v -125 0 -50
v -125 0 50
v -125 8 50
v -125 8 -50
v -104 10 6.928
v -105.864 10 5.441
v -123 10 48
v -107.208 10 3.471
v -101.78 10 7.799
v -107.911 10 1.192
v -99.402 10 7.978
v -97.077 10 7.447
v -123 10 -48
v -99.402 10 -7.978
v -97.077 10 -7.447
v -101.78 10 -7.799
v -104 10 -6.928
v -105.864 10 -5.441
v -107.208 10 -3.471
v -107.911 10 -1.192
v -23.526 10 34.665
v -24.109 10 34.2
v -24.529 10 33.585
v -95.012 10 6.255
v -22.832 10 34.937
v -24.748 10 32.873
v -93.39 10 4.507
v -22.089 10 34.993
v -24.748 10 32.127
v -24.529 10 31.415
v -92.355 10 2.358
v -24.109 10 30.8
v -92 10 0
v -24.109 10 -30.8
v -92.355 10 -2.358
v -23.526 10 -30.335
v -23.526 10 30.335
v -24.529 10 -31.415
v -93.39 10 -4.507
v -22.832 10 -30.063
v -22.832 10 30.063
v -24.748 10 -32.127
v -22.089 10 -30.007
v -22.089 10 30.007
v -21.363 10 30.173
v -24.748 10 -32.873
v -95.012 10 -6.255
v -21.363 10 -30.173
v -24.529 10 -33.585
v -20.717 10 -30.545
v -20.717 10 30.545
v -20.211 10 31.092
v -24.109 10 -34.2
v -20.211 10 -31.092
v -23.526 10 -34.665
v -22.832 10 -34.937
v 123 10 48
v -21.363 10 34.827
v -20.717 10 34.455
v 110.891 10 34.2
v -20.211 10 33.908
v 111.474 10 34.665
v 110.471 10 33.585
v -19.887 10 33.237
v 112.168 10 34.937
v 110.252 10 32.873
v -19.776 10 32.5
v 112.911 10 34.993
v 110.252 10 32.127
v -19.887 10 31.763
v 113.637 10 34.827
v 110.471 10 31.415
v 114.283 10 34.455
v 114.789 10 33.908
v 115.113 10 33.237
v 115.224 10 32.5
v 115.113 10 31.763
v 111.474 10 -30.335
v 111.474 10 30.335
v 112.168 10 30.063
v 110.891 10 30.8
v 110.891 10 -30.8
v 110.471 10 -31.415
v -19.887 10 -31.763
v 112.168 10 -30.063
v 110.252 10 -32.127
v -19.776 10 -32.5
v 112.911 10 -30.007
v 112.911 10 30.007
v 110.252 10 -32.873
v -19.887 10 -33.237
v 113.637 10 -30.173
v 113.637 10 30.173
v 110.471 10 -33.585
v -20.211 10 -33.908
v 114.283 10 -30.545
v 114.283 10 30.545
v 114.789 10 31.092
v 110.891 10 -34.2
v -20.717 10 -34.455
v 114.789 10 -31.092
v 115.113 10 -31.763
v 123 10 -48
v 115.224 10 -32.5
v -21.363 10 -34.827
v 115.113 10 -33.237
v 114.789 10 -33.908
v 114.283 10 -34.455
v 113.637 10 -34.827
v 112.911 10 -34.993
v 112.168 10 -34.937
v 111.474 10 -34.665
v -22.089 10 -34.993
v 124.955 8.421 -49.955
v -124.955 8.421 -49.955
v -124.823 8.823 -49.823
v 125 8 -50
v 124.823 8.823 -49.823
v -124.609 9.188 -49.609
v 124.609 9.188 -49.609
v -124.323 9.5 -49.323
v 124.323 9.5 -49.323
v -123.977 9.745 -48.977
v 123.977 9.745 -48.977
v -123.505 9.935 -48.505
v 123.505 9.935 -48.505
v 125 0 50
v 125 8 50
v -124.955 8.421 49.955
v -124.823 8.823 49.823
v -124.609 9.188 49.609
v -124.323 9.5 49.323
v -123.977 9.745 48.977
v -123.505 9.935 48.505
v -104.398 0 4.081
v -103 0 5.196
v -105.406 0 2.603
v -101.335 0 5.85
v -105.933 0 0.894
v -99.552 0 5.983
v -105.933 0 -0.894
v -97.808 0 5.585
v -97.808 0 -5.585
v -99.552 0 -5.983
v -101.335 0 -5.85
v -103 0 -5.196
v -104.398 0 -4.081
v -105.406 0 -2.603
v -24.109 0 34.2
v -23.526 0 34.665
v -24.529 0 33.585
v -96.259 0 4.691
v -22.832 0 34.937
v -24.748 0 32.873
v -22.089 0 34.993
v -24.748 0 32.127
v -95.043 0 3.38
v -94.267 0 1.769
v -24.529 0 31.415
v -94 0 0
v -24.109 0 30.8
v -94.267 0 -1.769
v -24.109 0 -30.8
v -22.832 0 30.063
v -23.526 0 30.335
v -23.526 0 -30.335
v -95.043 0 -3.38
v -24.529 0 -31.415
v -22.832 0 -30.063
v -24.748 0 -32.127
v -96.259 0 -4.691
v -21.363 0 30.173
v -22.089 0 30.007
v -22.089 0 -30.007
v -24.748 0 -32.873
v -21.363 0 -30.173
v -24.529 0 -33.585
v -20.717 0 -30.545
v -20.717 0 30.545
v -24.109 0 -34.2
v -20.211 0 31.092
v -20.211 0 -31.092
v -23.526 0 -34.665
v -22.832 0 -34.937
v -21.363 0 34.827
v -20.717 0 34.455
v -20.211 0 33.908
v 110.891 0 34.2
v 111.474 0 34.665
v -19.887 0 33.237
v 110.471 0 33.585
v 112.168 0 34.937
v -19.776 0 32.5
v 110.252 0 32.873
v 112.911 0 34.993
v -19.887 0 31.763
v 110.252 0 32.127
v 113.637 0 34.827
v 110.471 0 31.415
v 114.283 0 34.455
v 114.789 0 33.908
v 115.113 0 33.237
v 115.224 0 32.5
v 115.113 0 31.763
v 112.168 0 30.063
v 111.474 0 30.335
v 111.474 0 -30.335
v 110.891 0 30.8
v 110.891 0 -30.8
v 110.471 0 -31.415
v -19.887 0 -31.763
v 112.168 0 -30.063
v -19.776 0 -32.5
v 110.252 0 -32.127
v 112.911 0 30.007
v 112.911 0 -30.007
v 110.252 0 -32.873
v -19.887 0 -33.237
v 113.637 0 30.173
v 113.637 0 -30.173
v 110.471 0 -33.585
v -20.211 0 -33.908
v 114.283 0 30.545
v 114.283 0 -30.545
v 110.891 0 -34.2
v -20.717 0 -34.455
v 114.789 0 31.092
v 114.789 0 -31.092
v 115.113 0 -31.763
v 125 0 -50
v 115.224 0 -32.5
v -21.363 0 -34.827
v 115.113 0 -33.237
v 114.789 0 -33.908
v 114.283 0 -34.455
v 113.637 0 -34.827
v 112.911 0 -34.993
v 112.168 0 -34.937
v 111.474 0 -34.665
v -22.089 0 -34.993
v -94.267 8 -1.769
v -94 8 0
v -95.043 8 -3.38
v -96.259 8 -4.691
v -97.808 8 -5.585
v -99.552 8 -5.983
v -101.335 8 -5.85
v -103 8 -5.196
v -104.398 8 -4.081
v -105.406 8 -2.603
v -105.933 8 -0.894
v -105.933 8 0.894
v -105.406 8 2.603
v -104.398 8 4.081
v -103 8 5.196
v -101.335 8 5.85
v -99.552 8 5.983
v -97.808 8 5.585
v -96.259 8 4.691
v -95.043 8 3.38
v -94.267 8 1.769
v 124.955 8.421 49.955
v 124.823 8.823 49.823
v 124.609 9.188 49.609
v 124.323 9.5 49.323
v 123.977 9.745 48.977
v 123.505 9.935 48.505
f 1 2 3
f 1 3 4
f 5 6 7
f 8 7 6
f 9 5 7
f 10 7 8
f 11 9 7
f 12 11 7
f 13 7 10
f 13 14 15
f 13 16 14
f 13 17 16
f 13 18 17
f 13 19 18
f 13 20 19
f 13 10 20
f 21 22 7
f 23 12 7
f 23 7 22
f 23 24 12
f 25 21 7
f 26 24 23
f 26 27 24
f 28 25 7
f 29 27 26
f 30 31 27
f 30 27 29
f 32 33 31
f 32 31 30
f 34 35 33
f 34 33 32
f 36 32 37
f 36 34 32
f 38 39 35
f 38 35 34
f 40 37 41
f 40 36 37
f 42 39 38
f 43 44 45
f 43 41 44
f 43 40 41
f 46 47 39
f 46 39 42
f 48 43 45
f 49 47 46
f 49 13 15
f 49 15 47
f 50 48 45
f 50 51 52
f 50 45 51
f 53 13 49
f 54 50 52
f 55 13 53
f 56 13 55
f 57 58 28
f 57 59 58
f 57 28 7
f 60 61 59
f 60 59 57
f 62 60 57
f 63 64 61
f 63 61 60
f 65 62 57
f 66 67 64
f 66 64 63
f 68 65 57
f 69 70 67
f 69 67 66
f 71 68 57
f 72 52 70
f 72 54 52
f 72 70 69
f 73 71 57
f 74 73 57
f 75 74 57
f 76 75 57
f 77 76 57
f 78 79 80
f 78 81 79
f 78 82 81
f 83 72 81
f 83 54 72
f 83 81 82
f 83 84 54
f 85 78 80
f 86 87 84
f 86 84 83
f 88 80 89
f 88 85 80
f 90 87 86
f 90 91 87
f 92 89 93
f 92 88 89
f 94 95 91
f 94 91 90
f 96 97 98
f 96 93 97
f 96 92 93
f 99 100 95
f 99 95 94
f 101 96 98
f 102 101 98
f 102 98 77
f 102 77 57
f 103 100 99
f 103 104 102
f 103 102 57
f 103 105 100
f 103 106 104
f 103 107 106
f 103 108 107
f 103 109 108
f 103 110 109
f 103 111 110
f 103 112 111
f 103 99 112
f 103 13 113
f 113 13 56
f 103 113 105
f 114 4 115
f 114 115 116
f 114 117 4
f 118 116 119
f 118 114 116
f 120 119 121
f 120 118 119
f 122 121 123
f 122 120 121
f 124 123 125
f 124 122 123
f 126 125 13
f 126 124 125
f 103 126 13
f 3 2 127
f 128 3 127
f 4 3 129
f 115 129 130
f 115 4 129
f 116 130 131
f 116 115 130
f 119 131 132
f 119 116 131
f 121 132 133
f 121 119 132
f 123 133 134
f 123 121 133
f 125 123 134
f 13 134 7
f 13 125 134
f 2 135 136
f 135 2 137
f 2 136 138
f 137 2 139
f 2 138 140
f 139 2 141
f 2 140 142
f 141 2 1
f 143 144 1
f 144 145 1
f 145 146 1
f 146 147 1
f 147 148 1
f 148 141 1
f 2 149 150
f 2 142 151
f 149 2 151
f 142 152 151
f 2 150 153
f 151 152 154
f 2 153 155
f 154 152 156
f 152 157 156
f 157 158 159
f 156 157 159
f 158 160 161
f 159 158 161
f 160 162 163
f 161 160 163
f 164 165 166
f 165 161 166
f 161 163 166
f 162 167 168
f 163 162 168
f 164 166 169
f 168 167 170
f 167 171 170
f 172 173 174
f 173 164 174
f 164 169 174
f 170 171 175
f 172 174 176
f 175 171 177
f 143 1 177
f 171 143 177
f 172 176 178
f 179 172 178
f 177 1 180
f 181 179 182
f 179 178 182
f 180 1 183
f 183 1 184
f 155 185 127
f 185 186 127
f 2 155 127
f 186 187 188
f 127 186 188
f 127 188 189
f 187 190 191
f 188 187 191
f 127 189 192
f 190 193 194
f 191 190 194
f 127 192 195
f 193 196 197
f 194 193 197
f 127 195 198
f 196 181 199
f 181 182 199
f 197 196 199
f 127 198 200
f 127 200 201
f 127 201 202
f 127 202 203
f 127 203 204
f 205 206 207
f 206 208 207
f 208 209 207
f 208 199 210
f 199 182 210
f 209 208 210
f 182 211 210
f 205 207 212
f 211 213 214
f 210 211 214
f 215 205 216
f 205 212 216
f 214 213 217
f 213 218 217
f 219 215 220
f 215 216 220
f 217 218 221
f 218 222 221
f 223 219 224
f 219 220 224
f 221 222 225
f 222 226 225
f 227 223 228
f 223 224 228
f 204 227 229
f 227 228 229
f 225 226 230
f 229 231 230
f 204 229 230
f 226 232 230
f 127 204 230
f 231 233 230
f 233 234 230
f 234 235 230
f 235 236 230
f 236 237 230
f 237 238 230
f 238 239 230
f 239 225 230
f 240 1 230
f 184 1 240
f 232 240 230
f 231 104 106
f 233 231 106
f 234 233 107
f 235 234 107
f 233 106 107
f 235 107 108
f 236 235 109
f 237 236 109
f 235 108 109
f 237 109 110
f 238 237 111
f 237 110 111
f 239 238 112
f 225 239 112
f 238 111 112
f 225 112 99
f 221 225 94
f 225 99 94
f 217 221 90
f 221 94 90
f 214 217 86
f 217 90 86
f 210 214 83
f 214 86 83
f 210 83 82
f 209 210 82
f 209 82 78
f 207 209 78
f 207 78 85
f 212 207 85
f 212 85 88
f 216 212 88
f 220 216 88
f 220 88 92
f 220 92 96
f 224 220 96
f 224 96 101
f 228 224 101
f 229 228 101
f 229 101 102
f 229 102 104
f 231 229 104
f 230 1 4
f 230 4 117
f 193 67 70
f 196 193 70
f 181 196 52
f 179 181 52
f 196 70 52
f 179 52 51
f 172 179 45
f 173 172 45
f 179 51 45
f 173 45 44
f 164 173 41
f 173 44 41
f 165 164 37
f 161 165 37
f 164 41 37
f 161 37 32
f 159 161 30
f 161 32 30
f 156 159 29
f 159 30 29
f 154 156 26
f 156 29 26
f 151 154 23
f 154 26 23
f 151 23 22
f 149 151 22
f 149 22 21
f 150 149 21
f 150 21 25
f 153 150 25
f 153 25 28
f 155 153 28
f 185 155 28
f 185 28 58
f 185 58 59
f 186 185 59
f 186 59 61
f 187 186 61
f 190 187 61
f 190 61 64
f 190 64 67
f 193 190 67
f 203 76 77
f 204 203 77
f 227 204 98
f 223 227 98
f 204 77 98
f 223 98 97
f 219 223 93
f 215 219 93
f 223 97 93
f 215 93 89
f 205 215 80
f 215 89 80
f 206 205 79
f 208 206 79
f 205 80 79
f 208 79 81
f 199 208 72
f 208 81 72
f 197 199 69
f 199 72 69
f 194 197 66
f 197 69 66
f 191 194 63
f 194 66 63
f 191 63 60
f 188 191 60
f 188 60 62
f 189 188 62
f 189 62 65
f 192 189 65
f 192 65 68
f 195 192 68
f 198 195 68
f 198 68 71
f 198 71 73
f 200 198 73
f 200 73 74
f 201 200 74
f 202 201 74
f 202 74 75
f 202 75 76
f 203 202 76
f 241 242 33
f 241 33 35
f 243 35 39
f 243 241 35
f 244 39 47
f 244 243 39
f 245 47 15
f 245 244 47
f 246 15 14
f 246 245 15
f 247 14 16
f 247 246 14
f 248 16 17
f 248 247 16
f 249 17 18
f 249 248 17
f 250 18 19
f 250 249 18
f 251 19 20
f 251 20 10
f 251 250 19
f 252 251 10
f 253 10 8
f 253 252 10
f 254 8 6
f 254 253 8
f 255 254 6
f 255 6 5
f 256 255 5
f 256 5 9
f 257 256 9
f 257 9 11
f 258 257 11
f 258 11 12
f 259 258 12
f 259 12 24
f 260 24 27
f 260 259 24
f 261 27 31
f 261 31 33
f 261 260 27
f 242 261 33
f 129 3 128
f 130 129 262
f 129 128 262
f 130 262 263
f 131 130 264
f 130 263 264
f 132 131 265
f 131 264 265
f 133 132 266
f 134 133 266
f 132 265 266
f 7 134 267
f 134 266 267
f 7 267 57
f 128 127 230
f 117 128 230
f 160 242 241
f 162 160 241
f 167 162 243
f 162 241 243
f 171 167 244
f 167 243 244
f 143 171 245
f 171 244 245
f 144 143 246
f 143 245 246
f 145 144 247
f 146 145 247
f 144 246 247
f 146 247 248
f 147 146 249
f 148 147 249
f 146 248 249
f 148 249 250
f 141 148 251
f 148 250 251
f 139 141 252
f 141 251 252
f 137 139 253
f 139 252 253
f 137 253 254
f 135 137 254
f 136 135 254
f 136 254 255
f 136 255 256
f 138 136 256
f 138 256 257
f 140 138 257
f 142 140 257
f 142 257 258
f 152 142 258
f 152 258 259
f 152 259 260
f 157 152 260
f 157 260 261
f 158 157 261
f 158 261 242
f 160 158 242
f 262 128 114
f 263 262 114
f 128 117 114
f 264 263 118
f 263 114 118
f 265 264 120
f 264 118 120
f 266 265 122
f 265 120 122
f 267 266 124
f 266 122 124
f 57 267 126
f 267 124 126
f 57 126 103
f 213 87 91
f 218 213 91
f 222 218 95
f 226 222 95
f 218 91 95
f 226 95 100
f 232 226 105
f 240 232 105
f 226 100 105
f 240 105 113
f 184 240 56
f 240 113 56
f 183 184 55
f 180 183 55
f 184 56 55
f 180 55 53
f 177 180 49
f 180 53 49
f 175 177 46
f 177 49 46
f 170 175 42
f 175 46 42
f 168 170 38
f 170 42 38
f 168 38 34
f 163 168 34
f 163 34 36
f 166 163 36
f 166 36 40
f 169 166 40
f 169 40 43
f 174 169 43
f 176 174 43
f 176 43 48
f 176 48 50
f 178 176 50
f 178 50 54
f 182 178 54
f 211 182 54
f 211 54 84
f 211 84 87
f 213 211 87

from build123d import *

# Parameters (mm, degrees)
SKETCH1_W           = 250
SKETCH1_H           = 100
BOSS_EXTRUDE1_DEPTH = 10
FILLET1_R           = 2
SKETCH2_R           = 6
CUT_EXTRUDE1_DEPTH  = 11
CHAMFER1_SIZE       = 2
SKETCH3_R           = 2.5
CUT_EXTRUDE2_DEPTH  = 11


with BuildPart() as part:
    # Sketch1 → Boss-Extrude1 (new body)
    with BuildSketch(Plane(origin=(0, 0, 0), x_dir=(1, 0, 0), z_dir=(0, 1, 0))):
        Rectangle(SKETCH1_W, SKETCH1_H)
    extrude(amount=BOSS_EXTRUDE1_DEPTH)

    # Fillet1
    fillet1_edges = [part.edges().sort_by_distance(p)[0] for p in [
        (125, 10, 0),
        (0, 10, -50),
        (-125, 10, 0),
        (0, 10, 50),
    ]]
    fillet(fillet1_edges, radius=FILLET1_R)

    # Sketch2 → Cut-Extrude1 (cut, through all)
    with BuildSketch(Plane(origin=(0, 10, 0), x_dir=(1, 0, 0), z_dir=(0, 1, 0))):
        with Locations((-100, 0)):
            Circle(SKETCH2_R)
    extrude(amount=-CUT_EXTRUDE1_DEPTH, mode=Mode.SUBTRACT)

    # Chamfer1
    chamfer1_edges = [part.edges().sort_by_distance(p)[0] for p in [
        (-106, 10, 0),
    ]]
    chamfer(chamfer1_edges, length=CHAMFER1_SIZE)

    # Sketch3 → Cut-Extrude2 (cut, through all)
    with BuildSketch(Plane(origin=(0, 10, 0), x_dir=(1, 0, 0), z_dir=(0, 1, 0))):
        with Locations((112.723846374, 32.5)):
            Circle(SKETCH3_R)
        with Locations((112.723846374, -32.5)):
            Circle(SKETCH3_R)
        with Locations((-22.276153626, 32.5)):
            Circle(SKETCH3_R)
        with Locations((-22.276153626, -32.5)):
            Circle(SKETCH3_R)
    extrude(amount=-CUT_EXTRUDE2_DEPTH, mode=Mode.SUBTRACT)


solid = part.part
